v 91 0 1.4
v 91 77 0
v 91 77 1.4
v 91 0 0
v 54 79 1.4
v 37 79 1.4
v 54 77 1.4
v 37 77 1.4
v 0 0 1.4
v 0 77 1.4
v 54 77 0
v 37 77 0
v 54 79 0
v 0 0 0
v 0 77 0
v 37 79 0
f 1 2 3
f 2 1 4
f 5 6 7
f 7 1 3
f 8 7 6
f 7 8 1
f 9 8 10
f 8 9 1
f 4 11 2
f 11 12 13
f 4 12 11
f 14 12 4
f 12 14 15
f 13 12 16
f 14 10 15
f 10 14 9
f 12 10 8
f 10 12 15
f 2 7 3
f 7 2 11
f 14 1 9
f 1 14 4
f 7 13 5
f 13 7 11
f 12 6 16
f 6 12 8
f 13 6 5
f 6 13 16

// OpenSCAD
epd_length = 91;
epd_width = 77;
epd_height = 1.2 + .2;

epd_cable_length = 17;
epd_cable_width = 1;
epd_outer_width = epd_width + epd_cable_width;


module epaper_display(
    length=epd_length, 
    width=epd_width, 
    height=epd_height,
    cable_length = epd_cable_length,
    cable_width = epd_cable_width
 ) {
        
    cable_x_offset = (epd_length - cable_length) / 2;
    cable_y_offset = width;

    cube([length, width, height]);
    translate([cable_x_offset, cable_y_offset-1, 0])
        cube([cable_length, cable_width+2, height]);

    }

function epaper_dimensions(
    length=epd_length, 
    width=epd_width, 
    height=epd_height,
    cable_length = epd_cable_length,
    cable_width = epd_cable_width)
    = [length, width+cable_width, height, epd_cable_length];



epaper_display();
echo("Standard ePaper Outer Dimensions:", epaper_dimensions());
